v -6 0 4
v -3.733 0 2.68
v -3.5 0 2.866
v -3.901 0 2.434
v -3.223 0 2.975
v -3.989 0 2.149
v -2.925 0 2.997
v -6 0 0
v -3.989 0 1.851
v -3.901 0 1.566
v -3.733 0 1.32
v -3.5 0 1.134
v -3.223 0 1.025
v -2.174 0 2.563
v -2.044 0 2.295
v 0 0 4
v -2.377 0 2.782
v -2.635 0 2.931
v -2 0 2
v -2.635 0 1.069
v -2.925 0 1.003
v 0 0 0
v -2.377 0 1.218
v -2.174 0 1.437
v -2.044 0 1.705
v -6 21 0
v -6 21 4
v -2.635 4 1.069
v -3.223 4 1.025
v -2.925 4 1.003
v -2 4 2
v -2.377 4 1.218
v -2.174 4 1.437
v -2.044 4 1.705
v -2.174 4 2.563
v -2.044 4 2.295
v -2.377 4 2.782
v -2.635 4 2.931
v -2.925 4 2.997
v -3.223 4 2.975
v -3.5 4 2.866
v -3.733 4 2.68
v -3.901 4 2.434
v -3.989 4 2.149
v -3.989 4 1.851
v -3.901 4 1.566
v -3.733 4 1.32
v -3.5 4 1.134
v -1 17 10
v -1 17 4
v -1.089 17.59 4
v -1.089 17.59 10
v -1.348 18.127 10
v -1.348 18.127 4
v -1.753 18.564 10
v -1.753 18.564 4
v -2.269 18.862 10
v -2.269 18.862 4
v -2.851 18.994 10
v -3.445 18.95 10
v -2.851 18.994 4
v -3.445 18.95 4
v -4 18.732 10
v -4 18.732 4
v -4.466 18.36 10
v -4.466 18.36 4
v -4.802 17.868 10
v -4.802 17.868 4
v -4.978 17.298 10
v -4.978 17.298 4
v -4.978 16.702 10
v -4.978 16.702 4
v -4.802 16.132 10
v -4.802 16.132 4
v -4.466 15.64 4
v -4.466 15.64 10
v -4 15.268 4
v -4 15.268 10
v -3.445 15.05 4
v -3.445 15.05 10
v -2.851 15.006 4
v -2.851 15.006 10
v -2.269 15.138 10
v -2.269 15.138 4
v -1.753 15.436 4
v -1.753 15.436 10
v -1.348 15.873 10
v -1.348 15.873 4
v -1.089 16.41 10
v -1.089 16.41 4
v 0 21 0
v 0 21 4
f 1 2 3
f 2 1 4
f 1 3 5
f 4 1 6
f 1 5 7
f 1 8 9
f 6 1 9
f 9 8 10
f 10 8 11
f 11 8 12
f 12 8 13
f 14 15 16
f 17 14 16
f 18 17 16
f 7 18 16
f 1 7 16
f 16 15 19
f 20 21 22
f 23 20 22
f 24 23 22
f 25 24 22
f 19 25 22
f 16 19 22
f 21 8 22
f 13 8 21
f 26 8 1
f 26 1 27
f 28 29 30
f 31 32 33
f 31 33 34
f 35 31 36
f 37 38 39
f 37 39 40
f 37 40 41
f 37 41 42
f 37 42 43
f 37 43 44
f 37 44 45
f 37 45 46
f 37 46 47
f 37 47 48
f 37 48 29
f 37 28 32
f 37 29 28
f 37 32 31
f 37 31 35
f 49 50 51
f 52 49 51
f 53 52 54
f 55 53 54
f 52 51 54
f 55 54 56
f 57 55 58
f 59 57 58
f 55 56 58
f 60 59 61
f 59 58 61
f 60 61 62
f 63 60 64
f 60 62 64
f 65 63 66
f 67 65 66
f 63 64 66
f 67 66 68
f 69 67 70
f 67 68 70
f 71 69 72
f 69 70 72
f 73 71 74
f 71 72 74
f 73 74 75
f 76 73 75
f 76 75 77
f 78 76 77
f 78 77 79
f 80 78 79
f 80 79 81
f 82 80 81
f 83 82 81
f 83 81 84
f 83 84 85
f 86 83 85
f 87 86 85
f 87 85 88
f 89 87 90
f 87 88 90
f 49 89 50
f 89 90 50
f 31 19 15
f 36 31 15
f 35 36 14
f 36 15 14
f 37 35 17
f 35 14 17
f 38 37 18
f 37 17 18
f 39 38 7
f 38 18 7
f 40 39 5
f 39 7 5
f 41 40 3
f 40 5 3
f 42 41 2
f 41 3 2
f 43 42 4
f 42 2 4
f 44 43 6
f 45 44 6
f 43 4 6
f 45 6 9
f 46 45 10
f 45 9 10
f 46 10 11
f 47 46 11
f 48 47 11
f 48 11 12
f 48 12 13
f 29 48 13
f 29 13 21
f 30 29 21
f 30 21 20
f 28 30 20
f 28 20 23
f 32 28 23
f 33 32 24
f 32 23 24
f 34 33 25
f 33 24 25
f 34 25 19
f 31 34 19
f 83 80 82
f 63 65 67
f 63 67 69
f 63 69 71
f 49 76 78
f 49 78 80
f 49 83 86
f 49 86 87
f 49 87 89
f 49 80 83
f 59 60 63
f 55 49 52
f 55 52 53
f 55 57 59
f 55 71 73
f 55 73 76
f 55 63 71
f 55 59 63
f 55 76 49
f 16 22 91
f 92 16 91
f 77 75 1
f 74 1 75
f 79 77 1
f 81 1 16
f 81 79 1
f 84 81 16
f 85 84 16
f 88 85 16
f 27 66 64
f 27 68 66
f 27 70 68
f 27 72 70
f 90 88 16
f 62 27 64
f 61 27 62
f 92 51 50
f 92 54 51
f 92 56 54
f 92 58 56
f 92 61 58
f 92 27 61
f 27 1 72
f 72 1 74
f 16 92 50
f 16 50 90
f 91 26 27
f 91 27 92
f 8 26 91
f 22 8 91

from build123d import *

# Parameters (mm, degrees)
F0_W     = 6
F0_H     = 21
F1_DEPTH = 4
F2_R     = 2
F3_DEPTH = 6
F4_R     = 1
F5_DEPTH = 4


with BuildPart() as f1:
    # F0 (on Top) → F1 (new body)
    with BuildSketch(Plane.XY):
        with Locations((-3, 10.5)):
            Rectangle(F0_W, F0_H)
    extrude(amount=F1_DEPTH)

    # F2 (on face) → F3 (join)
    with BuildSketch(Plane.XY.offset(4)):
        with Locations((-3, 17)):
            Circle(F2_R)
    extrude(amount=F3_DEPTH)

    # F4 (on face) → F5 (cut)
    with BuildSketch(Plane.XZ):
        with Locations((-3, 2)):
            Circle(F4_R)
    extrude(amount=-F5_DEPTH, mode=Mode.SUBTRACT)


solid = f1.part
